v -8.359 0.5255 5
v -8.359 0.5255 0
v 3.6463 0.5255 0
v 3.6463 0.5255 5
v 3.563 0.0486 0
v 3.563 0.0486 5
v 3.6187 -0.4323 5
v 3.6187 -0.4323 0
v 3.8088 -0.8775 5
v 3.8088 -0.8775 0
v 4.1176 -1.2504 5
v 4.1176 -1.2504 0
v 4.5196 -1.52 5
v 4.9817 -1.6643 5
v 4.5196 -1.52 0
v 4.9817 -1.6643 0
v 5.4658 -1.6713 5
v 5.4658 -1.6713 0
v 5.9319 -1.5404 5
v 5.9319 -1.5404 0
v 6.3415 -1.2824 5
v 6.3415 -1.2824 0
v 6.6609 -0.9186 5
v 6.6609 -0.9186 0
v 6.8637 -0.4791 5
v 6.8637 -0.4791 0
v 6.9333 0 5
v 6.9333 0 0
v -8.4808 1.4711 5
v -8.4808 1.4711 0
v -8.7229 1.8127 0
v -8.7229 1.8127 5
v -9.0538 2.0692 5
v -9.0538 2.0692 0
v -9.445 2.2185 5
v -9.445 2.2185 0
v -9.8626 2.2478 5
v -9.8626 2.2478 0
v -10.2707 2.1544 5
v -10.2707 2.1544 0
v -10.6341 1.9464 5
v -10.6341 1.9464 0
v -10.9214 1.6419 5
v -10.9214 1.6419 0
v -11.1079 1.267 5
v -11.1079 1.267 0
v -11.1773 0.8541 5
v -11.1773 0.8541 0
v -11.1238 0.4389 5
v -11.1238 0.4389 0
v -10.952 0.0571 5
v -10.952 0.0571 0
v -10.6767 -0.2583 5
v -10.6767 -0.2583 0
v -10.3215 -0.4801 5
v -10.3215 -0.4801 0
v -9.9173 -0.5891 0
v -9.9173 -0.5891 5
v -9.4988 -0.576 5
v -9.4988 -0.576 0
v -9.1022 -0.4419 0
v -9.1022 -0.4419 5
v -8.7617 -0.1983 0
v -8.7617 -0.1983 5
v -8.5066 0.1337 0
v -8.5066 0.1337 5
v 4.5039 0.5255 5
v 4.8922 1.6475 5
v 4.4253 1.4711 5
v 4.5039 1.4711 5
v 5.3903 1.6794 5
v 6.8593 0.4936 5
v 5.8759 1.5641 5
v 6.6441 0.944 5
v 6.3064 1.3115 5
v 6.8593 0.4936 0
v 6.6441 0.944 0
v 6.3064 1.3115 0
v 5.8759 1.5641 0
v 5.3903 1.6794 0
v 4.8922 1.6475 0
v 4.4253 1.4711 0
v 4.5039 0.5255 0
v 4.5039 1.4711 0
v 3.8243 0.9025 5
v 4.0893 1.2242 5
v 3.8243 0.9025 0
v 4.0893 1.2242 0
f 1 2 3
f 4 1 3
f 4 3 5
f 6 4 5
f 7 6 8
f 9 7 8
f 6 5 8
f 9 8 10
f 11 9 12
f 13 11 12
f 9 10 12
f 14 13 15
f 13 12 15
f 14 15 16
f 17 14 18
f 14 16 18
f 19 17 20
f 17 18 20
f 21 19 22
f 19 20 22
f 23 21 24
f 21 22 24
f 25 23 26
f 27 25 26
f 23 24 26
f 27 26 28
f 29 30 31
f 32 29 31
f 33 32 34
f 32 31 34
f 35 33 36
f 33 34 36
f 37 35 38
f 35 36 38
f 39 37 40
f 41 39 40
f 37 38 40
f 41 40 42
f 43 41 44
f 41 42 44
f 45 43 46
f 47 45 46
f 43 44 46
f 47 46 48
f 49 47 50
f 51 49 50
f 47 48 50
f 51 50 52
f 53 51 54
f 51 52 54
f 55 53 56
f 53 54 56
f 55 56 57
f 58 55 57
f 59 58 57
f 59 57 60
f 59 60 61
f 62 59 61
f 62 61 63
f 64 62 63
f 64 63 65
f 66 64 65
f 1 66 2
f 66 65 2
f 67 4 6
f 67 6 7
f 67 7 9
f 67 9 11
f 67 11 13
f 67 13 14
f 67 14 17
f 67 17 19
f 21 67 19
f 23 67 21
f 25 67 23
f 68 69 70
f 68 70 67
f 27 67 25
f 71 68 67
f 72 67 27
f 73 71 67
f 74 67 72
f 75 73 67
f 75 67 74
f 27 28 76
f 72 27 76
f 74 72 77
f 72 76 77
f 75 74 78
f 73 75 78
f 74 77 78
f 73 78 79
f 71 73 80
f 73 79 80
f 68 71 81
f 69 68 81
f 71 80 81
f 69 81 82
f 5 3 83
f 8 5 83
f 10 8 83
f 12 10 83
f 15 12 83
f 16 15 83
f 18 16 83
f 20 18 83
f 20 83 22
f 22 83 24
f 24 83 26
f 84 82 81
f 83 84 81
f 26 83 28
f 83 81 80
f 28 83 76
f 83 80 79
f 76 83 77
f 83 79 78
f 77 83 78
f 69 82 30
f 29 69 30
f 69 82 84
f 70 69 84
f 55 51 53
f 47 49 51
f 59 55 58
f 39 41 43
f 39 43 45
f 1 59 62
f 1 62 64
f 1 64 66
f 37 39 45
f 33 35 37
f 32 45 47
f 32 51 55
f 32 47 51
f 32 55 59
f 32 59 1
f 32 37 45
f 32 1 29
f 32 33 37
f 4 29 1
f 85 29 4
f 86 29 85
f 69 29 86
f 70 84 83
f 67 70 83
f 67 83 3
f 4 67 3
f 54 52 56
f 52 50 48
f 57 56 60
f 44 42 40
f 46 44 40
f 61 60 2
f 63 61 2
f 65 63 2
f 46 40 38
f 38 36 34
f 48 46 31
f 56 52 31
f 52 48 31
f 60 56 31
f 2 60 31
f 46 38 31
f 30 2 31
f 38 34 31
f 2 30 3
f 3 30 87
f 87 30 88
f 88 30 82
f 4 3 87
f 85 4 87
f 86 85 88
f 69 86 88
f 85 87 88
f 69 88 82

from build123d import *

# Parameters (mm, degrees)
F1_DEPTH = 5


with BuildPart() as f1:
    # F0 (on Top) → F1 (new body)
    with BuildSketch(Plane.XY):
        with BuildLine():
            ThreePointArc((6.9332515671, 0), (6.1005577036, 1.4538081103), (4.4252555029, 1.4711178839))
            Line((4.4252555029, 1.4711178839), (4.503922537, 1.4711178839))
            Line((4.503922537, 1.4711178839), (4.503922537, 0.5254589021))
            Line((4.503922537, 0.5254589021), (3.6463423756, 0.5254589021))
            ThreePointArc((3.6463423756, 0.5254589021), (4.9817304551, -1.6643226168), (6.9332515671, 0))
        make_face()
    extrude(amount=F1_DEPTH)


with BuildPart() as f1b:
    # F0 (on Top) → F1, piece 2 (new body)
    with BuildSketch(Plane.XY):
        with BuildLine():
            ThreePointArc((-8.4808278434, 1.4711178839), (-8.365855866, 1.1579627381), (-8.3268191465, 0.8266610093))
            ThreePointArc((-8.3268191465, 0.8266610093), (-8.3348888277, 0.6752024877), (-8.3590064999, 0.5254589021))
            Line((-8.3590064999, 0.5254589021), (3.6463423756, 0.5254589021))
            ThreePointArc((3.6463423756, 0.5254589021), (3.9468330448, 1.0715671377), (4.4252555029, 1.4711178839))
            Line((4.4252555029, 1.4711178839), (-8.4808278434, 1.4711178839))
        make_face()
        with BuildLine():
            Line((-10.496077463, 1.4711178839), (-8.4808278434, 1.4711178839))
            ThreePointArc((-8.4808278434, 1.4711178839), (-11.1659069996, 0.6445454725), (-8.3590064999, 0.5254589021))
            Line((-8.3590064999, 0.5254589021), (-10.496077463, 0.5254589021))
            Line((-10.496077463, 0.5254589021), (-10.496077463, 1.4711178839))
        make_face()
        with BuildLine():
            ThreePointArc((-8.3590064999, 0.5254589021), (-8.3348888277, 0.6752024877), (-8.3268191465, 0.8266610093))
            ThreePointArc((-8.3268191465, 0.8266610093), (-8.365855866, 1.1579627381), (-8.4808278434, 1.4711178839))
            Line((-8.4808278434, 1.4711178839), (-10.496077463, 1.4711178839))
            Line((-10.496077463, 1.4711178839), (-10.496077463, 0.5254589021))
            Line((-10.496077463, 0.5254589021), (-8.3590064999, 0.5254589021))
        make_face()
    extrude(amount=F1_DEPTH)


solid = Compound([f1.part, f1b.part])
